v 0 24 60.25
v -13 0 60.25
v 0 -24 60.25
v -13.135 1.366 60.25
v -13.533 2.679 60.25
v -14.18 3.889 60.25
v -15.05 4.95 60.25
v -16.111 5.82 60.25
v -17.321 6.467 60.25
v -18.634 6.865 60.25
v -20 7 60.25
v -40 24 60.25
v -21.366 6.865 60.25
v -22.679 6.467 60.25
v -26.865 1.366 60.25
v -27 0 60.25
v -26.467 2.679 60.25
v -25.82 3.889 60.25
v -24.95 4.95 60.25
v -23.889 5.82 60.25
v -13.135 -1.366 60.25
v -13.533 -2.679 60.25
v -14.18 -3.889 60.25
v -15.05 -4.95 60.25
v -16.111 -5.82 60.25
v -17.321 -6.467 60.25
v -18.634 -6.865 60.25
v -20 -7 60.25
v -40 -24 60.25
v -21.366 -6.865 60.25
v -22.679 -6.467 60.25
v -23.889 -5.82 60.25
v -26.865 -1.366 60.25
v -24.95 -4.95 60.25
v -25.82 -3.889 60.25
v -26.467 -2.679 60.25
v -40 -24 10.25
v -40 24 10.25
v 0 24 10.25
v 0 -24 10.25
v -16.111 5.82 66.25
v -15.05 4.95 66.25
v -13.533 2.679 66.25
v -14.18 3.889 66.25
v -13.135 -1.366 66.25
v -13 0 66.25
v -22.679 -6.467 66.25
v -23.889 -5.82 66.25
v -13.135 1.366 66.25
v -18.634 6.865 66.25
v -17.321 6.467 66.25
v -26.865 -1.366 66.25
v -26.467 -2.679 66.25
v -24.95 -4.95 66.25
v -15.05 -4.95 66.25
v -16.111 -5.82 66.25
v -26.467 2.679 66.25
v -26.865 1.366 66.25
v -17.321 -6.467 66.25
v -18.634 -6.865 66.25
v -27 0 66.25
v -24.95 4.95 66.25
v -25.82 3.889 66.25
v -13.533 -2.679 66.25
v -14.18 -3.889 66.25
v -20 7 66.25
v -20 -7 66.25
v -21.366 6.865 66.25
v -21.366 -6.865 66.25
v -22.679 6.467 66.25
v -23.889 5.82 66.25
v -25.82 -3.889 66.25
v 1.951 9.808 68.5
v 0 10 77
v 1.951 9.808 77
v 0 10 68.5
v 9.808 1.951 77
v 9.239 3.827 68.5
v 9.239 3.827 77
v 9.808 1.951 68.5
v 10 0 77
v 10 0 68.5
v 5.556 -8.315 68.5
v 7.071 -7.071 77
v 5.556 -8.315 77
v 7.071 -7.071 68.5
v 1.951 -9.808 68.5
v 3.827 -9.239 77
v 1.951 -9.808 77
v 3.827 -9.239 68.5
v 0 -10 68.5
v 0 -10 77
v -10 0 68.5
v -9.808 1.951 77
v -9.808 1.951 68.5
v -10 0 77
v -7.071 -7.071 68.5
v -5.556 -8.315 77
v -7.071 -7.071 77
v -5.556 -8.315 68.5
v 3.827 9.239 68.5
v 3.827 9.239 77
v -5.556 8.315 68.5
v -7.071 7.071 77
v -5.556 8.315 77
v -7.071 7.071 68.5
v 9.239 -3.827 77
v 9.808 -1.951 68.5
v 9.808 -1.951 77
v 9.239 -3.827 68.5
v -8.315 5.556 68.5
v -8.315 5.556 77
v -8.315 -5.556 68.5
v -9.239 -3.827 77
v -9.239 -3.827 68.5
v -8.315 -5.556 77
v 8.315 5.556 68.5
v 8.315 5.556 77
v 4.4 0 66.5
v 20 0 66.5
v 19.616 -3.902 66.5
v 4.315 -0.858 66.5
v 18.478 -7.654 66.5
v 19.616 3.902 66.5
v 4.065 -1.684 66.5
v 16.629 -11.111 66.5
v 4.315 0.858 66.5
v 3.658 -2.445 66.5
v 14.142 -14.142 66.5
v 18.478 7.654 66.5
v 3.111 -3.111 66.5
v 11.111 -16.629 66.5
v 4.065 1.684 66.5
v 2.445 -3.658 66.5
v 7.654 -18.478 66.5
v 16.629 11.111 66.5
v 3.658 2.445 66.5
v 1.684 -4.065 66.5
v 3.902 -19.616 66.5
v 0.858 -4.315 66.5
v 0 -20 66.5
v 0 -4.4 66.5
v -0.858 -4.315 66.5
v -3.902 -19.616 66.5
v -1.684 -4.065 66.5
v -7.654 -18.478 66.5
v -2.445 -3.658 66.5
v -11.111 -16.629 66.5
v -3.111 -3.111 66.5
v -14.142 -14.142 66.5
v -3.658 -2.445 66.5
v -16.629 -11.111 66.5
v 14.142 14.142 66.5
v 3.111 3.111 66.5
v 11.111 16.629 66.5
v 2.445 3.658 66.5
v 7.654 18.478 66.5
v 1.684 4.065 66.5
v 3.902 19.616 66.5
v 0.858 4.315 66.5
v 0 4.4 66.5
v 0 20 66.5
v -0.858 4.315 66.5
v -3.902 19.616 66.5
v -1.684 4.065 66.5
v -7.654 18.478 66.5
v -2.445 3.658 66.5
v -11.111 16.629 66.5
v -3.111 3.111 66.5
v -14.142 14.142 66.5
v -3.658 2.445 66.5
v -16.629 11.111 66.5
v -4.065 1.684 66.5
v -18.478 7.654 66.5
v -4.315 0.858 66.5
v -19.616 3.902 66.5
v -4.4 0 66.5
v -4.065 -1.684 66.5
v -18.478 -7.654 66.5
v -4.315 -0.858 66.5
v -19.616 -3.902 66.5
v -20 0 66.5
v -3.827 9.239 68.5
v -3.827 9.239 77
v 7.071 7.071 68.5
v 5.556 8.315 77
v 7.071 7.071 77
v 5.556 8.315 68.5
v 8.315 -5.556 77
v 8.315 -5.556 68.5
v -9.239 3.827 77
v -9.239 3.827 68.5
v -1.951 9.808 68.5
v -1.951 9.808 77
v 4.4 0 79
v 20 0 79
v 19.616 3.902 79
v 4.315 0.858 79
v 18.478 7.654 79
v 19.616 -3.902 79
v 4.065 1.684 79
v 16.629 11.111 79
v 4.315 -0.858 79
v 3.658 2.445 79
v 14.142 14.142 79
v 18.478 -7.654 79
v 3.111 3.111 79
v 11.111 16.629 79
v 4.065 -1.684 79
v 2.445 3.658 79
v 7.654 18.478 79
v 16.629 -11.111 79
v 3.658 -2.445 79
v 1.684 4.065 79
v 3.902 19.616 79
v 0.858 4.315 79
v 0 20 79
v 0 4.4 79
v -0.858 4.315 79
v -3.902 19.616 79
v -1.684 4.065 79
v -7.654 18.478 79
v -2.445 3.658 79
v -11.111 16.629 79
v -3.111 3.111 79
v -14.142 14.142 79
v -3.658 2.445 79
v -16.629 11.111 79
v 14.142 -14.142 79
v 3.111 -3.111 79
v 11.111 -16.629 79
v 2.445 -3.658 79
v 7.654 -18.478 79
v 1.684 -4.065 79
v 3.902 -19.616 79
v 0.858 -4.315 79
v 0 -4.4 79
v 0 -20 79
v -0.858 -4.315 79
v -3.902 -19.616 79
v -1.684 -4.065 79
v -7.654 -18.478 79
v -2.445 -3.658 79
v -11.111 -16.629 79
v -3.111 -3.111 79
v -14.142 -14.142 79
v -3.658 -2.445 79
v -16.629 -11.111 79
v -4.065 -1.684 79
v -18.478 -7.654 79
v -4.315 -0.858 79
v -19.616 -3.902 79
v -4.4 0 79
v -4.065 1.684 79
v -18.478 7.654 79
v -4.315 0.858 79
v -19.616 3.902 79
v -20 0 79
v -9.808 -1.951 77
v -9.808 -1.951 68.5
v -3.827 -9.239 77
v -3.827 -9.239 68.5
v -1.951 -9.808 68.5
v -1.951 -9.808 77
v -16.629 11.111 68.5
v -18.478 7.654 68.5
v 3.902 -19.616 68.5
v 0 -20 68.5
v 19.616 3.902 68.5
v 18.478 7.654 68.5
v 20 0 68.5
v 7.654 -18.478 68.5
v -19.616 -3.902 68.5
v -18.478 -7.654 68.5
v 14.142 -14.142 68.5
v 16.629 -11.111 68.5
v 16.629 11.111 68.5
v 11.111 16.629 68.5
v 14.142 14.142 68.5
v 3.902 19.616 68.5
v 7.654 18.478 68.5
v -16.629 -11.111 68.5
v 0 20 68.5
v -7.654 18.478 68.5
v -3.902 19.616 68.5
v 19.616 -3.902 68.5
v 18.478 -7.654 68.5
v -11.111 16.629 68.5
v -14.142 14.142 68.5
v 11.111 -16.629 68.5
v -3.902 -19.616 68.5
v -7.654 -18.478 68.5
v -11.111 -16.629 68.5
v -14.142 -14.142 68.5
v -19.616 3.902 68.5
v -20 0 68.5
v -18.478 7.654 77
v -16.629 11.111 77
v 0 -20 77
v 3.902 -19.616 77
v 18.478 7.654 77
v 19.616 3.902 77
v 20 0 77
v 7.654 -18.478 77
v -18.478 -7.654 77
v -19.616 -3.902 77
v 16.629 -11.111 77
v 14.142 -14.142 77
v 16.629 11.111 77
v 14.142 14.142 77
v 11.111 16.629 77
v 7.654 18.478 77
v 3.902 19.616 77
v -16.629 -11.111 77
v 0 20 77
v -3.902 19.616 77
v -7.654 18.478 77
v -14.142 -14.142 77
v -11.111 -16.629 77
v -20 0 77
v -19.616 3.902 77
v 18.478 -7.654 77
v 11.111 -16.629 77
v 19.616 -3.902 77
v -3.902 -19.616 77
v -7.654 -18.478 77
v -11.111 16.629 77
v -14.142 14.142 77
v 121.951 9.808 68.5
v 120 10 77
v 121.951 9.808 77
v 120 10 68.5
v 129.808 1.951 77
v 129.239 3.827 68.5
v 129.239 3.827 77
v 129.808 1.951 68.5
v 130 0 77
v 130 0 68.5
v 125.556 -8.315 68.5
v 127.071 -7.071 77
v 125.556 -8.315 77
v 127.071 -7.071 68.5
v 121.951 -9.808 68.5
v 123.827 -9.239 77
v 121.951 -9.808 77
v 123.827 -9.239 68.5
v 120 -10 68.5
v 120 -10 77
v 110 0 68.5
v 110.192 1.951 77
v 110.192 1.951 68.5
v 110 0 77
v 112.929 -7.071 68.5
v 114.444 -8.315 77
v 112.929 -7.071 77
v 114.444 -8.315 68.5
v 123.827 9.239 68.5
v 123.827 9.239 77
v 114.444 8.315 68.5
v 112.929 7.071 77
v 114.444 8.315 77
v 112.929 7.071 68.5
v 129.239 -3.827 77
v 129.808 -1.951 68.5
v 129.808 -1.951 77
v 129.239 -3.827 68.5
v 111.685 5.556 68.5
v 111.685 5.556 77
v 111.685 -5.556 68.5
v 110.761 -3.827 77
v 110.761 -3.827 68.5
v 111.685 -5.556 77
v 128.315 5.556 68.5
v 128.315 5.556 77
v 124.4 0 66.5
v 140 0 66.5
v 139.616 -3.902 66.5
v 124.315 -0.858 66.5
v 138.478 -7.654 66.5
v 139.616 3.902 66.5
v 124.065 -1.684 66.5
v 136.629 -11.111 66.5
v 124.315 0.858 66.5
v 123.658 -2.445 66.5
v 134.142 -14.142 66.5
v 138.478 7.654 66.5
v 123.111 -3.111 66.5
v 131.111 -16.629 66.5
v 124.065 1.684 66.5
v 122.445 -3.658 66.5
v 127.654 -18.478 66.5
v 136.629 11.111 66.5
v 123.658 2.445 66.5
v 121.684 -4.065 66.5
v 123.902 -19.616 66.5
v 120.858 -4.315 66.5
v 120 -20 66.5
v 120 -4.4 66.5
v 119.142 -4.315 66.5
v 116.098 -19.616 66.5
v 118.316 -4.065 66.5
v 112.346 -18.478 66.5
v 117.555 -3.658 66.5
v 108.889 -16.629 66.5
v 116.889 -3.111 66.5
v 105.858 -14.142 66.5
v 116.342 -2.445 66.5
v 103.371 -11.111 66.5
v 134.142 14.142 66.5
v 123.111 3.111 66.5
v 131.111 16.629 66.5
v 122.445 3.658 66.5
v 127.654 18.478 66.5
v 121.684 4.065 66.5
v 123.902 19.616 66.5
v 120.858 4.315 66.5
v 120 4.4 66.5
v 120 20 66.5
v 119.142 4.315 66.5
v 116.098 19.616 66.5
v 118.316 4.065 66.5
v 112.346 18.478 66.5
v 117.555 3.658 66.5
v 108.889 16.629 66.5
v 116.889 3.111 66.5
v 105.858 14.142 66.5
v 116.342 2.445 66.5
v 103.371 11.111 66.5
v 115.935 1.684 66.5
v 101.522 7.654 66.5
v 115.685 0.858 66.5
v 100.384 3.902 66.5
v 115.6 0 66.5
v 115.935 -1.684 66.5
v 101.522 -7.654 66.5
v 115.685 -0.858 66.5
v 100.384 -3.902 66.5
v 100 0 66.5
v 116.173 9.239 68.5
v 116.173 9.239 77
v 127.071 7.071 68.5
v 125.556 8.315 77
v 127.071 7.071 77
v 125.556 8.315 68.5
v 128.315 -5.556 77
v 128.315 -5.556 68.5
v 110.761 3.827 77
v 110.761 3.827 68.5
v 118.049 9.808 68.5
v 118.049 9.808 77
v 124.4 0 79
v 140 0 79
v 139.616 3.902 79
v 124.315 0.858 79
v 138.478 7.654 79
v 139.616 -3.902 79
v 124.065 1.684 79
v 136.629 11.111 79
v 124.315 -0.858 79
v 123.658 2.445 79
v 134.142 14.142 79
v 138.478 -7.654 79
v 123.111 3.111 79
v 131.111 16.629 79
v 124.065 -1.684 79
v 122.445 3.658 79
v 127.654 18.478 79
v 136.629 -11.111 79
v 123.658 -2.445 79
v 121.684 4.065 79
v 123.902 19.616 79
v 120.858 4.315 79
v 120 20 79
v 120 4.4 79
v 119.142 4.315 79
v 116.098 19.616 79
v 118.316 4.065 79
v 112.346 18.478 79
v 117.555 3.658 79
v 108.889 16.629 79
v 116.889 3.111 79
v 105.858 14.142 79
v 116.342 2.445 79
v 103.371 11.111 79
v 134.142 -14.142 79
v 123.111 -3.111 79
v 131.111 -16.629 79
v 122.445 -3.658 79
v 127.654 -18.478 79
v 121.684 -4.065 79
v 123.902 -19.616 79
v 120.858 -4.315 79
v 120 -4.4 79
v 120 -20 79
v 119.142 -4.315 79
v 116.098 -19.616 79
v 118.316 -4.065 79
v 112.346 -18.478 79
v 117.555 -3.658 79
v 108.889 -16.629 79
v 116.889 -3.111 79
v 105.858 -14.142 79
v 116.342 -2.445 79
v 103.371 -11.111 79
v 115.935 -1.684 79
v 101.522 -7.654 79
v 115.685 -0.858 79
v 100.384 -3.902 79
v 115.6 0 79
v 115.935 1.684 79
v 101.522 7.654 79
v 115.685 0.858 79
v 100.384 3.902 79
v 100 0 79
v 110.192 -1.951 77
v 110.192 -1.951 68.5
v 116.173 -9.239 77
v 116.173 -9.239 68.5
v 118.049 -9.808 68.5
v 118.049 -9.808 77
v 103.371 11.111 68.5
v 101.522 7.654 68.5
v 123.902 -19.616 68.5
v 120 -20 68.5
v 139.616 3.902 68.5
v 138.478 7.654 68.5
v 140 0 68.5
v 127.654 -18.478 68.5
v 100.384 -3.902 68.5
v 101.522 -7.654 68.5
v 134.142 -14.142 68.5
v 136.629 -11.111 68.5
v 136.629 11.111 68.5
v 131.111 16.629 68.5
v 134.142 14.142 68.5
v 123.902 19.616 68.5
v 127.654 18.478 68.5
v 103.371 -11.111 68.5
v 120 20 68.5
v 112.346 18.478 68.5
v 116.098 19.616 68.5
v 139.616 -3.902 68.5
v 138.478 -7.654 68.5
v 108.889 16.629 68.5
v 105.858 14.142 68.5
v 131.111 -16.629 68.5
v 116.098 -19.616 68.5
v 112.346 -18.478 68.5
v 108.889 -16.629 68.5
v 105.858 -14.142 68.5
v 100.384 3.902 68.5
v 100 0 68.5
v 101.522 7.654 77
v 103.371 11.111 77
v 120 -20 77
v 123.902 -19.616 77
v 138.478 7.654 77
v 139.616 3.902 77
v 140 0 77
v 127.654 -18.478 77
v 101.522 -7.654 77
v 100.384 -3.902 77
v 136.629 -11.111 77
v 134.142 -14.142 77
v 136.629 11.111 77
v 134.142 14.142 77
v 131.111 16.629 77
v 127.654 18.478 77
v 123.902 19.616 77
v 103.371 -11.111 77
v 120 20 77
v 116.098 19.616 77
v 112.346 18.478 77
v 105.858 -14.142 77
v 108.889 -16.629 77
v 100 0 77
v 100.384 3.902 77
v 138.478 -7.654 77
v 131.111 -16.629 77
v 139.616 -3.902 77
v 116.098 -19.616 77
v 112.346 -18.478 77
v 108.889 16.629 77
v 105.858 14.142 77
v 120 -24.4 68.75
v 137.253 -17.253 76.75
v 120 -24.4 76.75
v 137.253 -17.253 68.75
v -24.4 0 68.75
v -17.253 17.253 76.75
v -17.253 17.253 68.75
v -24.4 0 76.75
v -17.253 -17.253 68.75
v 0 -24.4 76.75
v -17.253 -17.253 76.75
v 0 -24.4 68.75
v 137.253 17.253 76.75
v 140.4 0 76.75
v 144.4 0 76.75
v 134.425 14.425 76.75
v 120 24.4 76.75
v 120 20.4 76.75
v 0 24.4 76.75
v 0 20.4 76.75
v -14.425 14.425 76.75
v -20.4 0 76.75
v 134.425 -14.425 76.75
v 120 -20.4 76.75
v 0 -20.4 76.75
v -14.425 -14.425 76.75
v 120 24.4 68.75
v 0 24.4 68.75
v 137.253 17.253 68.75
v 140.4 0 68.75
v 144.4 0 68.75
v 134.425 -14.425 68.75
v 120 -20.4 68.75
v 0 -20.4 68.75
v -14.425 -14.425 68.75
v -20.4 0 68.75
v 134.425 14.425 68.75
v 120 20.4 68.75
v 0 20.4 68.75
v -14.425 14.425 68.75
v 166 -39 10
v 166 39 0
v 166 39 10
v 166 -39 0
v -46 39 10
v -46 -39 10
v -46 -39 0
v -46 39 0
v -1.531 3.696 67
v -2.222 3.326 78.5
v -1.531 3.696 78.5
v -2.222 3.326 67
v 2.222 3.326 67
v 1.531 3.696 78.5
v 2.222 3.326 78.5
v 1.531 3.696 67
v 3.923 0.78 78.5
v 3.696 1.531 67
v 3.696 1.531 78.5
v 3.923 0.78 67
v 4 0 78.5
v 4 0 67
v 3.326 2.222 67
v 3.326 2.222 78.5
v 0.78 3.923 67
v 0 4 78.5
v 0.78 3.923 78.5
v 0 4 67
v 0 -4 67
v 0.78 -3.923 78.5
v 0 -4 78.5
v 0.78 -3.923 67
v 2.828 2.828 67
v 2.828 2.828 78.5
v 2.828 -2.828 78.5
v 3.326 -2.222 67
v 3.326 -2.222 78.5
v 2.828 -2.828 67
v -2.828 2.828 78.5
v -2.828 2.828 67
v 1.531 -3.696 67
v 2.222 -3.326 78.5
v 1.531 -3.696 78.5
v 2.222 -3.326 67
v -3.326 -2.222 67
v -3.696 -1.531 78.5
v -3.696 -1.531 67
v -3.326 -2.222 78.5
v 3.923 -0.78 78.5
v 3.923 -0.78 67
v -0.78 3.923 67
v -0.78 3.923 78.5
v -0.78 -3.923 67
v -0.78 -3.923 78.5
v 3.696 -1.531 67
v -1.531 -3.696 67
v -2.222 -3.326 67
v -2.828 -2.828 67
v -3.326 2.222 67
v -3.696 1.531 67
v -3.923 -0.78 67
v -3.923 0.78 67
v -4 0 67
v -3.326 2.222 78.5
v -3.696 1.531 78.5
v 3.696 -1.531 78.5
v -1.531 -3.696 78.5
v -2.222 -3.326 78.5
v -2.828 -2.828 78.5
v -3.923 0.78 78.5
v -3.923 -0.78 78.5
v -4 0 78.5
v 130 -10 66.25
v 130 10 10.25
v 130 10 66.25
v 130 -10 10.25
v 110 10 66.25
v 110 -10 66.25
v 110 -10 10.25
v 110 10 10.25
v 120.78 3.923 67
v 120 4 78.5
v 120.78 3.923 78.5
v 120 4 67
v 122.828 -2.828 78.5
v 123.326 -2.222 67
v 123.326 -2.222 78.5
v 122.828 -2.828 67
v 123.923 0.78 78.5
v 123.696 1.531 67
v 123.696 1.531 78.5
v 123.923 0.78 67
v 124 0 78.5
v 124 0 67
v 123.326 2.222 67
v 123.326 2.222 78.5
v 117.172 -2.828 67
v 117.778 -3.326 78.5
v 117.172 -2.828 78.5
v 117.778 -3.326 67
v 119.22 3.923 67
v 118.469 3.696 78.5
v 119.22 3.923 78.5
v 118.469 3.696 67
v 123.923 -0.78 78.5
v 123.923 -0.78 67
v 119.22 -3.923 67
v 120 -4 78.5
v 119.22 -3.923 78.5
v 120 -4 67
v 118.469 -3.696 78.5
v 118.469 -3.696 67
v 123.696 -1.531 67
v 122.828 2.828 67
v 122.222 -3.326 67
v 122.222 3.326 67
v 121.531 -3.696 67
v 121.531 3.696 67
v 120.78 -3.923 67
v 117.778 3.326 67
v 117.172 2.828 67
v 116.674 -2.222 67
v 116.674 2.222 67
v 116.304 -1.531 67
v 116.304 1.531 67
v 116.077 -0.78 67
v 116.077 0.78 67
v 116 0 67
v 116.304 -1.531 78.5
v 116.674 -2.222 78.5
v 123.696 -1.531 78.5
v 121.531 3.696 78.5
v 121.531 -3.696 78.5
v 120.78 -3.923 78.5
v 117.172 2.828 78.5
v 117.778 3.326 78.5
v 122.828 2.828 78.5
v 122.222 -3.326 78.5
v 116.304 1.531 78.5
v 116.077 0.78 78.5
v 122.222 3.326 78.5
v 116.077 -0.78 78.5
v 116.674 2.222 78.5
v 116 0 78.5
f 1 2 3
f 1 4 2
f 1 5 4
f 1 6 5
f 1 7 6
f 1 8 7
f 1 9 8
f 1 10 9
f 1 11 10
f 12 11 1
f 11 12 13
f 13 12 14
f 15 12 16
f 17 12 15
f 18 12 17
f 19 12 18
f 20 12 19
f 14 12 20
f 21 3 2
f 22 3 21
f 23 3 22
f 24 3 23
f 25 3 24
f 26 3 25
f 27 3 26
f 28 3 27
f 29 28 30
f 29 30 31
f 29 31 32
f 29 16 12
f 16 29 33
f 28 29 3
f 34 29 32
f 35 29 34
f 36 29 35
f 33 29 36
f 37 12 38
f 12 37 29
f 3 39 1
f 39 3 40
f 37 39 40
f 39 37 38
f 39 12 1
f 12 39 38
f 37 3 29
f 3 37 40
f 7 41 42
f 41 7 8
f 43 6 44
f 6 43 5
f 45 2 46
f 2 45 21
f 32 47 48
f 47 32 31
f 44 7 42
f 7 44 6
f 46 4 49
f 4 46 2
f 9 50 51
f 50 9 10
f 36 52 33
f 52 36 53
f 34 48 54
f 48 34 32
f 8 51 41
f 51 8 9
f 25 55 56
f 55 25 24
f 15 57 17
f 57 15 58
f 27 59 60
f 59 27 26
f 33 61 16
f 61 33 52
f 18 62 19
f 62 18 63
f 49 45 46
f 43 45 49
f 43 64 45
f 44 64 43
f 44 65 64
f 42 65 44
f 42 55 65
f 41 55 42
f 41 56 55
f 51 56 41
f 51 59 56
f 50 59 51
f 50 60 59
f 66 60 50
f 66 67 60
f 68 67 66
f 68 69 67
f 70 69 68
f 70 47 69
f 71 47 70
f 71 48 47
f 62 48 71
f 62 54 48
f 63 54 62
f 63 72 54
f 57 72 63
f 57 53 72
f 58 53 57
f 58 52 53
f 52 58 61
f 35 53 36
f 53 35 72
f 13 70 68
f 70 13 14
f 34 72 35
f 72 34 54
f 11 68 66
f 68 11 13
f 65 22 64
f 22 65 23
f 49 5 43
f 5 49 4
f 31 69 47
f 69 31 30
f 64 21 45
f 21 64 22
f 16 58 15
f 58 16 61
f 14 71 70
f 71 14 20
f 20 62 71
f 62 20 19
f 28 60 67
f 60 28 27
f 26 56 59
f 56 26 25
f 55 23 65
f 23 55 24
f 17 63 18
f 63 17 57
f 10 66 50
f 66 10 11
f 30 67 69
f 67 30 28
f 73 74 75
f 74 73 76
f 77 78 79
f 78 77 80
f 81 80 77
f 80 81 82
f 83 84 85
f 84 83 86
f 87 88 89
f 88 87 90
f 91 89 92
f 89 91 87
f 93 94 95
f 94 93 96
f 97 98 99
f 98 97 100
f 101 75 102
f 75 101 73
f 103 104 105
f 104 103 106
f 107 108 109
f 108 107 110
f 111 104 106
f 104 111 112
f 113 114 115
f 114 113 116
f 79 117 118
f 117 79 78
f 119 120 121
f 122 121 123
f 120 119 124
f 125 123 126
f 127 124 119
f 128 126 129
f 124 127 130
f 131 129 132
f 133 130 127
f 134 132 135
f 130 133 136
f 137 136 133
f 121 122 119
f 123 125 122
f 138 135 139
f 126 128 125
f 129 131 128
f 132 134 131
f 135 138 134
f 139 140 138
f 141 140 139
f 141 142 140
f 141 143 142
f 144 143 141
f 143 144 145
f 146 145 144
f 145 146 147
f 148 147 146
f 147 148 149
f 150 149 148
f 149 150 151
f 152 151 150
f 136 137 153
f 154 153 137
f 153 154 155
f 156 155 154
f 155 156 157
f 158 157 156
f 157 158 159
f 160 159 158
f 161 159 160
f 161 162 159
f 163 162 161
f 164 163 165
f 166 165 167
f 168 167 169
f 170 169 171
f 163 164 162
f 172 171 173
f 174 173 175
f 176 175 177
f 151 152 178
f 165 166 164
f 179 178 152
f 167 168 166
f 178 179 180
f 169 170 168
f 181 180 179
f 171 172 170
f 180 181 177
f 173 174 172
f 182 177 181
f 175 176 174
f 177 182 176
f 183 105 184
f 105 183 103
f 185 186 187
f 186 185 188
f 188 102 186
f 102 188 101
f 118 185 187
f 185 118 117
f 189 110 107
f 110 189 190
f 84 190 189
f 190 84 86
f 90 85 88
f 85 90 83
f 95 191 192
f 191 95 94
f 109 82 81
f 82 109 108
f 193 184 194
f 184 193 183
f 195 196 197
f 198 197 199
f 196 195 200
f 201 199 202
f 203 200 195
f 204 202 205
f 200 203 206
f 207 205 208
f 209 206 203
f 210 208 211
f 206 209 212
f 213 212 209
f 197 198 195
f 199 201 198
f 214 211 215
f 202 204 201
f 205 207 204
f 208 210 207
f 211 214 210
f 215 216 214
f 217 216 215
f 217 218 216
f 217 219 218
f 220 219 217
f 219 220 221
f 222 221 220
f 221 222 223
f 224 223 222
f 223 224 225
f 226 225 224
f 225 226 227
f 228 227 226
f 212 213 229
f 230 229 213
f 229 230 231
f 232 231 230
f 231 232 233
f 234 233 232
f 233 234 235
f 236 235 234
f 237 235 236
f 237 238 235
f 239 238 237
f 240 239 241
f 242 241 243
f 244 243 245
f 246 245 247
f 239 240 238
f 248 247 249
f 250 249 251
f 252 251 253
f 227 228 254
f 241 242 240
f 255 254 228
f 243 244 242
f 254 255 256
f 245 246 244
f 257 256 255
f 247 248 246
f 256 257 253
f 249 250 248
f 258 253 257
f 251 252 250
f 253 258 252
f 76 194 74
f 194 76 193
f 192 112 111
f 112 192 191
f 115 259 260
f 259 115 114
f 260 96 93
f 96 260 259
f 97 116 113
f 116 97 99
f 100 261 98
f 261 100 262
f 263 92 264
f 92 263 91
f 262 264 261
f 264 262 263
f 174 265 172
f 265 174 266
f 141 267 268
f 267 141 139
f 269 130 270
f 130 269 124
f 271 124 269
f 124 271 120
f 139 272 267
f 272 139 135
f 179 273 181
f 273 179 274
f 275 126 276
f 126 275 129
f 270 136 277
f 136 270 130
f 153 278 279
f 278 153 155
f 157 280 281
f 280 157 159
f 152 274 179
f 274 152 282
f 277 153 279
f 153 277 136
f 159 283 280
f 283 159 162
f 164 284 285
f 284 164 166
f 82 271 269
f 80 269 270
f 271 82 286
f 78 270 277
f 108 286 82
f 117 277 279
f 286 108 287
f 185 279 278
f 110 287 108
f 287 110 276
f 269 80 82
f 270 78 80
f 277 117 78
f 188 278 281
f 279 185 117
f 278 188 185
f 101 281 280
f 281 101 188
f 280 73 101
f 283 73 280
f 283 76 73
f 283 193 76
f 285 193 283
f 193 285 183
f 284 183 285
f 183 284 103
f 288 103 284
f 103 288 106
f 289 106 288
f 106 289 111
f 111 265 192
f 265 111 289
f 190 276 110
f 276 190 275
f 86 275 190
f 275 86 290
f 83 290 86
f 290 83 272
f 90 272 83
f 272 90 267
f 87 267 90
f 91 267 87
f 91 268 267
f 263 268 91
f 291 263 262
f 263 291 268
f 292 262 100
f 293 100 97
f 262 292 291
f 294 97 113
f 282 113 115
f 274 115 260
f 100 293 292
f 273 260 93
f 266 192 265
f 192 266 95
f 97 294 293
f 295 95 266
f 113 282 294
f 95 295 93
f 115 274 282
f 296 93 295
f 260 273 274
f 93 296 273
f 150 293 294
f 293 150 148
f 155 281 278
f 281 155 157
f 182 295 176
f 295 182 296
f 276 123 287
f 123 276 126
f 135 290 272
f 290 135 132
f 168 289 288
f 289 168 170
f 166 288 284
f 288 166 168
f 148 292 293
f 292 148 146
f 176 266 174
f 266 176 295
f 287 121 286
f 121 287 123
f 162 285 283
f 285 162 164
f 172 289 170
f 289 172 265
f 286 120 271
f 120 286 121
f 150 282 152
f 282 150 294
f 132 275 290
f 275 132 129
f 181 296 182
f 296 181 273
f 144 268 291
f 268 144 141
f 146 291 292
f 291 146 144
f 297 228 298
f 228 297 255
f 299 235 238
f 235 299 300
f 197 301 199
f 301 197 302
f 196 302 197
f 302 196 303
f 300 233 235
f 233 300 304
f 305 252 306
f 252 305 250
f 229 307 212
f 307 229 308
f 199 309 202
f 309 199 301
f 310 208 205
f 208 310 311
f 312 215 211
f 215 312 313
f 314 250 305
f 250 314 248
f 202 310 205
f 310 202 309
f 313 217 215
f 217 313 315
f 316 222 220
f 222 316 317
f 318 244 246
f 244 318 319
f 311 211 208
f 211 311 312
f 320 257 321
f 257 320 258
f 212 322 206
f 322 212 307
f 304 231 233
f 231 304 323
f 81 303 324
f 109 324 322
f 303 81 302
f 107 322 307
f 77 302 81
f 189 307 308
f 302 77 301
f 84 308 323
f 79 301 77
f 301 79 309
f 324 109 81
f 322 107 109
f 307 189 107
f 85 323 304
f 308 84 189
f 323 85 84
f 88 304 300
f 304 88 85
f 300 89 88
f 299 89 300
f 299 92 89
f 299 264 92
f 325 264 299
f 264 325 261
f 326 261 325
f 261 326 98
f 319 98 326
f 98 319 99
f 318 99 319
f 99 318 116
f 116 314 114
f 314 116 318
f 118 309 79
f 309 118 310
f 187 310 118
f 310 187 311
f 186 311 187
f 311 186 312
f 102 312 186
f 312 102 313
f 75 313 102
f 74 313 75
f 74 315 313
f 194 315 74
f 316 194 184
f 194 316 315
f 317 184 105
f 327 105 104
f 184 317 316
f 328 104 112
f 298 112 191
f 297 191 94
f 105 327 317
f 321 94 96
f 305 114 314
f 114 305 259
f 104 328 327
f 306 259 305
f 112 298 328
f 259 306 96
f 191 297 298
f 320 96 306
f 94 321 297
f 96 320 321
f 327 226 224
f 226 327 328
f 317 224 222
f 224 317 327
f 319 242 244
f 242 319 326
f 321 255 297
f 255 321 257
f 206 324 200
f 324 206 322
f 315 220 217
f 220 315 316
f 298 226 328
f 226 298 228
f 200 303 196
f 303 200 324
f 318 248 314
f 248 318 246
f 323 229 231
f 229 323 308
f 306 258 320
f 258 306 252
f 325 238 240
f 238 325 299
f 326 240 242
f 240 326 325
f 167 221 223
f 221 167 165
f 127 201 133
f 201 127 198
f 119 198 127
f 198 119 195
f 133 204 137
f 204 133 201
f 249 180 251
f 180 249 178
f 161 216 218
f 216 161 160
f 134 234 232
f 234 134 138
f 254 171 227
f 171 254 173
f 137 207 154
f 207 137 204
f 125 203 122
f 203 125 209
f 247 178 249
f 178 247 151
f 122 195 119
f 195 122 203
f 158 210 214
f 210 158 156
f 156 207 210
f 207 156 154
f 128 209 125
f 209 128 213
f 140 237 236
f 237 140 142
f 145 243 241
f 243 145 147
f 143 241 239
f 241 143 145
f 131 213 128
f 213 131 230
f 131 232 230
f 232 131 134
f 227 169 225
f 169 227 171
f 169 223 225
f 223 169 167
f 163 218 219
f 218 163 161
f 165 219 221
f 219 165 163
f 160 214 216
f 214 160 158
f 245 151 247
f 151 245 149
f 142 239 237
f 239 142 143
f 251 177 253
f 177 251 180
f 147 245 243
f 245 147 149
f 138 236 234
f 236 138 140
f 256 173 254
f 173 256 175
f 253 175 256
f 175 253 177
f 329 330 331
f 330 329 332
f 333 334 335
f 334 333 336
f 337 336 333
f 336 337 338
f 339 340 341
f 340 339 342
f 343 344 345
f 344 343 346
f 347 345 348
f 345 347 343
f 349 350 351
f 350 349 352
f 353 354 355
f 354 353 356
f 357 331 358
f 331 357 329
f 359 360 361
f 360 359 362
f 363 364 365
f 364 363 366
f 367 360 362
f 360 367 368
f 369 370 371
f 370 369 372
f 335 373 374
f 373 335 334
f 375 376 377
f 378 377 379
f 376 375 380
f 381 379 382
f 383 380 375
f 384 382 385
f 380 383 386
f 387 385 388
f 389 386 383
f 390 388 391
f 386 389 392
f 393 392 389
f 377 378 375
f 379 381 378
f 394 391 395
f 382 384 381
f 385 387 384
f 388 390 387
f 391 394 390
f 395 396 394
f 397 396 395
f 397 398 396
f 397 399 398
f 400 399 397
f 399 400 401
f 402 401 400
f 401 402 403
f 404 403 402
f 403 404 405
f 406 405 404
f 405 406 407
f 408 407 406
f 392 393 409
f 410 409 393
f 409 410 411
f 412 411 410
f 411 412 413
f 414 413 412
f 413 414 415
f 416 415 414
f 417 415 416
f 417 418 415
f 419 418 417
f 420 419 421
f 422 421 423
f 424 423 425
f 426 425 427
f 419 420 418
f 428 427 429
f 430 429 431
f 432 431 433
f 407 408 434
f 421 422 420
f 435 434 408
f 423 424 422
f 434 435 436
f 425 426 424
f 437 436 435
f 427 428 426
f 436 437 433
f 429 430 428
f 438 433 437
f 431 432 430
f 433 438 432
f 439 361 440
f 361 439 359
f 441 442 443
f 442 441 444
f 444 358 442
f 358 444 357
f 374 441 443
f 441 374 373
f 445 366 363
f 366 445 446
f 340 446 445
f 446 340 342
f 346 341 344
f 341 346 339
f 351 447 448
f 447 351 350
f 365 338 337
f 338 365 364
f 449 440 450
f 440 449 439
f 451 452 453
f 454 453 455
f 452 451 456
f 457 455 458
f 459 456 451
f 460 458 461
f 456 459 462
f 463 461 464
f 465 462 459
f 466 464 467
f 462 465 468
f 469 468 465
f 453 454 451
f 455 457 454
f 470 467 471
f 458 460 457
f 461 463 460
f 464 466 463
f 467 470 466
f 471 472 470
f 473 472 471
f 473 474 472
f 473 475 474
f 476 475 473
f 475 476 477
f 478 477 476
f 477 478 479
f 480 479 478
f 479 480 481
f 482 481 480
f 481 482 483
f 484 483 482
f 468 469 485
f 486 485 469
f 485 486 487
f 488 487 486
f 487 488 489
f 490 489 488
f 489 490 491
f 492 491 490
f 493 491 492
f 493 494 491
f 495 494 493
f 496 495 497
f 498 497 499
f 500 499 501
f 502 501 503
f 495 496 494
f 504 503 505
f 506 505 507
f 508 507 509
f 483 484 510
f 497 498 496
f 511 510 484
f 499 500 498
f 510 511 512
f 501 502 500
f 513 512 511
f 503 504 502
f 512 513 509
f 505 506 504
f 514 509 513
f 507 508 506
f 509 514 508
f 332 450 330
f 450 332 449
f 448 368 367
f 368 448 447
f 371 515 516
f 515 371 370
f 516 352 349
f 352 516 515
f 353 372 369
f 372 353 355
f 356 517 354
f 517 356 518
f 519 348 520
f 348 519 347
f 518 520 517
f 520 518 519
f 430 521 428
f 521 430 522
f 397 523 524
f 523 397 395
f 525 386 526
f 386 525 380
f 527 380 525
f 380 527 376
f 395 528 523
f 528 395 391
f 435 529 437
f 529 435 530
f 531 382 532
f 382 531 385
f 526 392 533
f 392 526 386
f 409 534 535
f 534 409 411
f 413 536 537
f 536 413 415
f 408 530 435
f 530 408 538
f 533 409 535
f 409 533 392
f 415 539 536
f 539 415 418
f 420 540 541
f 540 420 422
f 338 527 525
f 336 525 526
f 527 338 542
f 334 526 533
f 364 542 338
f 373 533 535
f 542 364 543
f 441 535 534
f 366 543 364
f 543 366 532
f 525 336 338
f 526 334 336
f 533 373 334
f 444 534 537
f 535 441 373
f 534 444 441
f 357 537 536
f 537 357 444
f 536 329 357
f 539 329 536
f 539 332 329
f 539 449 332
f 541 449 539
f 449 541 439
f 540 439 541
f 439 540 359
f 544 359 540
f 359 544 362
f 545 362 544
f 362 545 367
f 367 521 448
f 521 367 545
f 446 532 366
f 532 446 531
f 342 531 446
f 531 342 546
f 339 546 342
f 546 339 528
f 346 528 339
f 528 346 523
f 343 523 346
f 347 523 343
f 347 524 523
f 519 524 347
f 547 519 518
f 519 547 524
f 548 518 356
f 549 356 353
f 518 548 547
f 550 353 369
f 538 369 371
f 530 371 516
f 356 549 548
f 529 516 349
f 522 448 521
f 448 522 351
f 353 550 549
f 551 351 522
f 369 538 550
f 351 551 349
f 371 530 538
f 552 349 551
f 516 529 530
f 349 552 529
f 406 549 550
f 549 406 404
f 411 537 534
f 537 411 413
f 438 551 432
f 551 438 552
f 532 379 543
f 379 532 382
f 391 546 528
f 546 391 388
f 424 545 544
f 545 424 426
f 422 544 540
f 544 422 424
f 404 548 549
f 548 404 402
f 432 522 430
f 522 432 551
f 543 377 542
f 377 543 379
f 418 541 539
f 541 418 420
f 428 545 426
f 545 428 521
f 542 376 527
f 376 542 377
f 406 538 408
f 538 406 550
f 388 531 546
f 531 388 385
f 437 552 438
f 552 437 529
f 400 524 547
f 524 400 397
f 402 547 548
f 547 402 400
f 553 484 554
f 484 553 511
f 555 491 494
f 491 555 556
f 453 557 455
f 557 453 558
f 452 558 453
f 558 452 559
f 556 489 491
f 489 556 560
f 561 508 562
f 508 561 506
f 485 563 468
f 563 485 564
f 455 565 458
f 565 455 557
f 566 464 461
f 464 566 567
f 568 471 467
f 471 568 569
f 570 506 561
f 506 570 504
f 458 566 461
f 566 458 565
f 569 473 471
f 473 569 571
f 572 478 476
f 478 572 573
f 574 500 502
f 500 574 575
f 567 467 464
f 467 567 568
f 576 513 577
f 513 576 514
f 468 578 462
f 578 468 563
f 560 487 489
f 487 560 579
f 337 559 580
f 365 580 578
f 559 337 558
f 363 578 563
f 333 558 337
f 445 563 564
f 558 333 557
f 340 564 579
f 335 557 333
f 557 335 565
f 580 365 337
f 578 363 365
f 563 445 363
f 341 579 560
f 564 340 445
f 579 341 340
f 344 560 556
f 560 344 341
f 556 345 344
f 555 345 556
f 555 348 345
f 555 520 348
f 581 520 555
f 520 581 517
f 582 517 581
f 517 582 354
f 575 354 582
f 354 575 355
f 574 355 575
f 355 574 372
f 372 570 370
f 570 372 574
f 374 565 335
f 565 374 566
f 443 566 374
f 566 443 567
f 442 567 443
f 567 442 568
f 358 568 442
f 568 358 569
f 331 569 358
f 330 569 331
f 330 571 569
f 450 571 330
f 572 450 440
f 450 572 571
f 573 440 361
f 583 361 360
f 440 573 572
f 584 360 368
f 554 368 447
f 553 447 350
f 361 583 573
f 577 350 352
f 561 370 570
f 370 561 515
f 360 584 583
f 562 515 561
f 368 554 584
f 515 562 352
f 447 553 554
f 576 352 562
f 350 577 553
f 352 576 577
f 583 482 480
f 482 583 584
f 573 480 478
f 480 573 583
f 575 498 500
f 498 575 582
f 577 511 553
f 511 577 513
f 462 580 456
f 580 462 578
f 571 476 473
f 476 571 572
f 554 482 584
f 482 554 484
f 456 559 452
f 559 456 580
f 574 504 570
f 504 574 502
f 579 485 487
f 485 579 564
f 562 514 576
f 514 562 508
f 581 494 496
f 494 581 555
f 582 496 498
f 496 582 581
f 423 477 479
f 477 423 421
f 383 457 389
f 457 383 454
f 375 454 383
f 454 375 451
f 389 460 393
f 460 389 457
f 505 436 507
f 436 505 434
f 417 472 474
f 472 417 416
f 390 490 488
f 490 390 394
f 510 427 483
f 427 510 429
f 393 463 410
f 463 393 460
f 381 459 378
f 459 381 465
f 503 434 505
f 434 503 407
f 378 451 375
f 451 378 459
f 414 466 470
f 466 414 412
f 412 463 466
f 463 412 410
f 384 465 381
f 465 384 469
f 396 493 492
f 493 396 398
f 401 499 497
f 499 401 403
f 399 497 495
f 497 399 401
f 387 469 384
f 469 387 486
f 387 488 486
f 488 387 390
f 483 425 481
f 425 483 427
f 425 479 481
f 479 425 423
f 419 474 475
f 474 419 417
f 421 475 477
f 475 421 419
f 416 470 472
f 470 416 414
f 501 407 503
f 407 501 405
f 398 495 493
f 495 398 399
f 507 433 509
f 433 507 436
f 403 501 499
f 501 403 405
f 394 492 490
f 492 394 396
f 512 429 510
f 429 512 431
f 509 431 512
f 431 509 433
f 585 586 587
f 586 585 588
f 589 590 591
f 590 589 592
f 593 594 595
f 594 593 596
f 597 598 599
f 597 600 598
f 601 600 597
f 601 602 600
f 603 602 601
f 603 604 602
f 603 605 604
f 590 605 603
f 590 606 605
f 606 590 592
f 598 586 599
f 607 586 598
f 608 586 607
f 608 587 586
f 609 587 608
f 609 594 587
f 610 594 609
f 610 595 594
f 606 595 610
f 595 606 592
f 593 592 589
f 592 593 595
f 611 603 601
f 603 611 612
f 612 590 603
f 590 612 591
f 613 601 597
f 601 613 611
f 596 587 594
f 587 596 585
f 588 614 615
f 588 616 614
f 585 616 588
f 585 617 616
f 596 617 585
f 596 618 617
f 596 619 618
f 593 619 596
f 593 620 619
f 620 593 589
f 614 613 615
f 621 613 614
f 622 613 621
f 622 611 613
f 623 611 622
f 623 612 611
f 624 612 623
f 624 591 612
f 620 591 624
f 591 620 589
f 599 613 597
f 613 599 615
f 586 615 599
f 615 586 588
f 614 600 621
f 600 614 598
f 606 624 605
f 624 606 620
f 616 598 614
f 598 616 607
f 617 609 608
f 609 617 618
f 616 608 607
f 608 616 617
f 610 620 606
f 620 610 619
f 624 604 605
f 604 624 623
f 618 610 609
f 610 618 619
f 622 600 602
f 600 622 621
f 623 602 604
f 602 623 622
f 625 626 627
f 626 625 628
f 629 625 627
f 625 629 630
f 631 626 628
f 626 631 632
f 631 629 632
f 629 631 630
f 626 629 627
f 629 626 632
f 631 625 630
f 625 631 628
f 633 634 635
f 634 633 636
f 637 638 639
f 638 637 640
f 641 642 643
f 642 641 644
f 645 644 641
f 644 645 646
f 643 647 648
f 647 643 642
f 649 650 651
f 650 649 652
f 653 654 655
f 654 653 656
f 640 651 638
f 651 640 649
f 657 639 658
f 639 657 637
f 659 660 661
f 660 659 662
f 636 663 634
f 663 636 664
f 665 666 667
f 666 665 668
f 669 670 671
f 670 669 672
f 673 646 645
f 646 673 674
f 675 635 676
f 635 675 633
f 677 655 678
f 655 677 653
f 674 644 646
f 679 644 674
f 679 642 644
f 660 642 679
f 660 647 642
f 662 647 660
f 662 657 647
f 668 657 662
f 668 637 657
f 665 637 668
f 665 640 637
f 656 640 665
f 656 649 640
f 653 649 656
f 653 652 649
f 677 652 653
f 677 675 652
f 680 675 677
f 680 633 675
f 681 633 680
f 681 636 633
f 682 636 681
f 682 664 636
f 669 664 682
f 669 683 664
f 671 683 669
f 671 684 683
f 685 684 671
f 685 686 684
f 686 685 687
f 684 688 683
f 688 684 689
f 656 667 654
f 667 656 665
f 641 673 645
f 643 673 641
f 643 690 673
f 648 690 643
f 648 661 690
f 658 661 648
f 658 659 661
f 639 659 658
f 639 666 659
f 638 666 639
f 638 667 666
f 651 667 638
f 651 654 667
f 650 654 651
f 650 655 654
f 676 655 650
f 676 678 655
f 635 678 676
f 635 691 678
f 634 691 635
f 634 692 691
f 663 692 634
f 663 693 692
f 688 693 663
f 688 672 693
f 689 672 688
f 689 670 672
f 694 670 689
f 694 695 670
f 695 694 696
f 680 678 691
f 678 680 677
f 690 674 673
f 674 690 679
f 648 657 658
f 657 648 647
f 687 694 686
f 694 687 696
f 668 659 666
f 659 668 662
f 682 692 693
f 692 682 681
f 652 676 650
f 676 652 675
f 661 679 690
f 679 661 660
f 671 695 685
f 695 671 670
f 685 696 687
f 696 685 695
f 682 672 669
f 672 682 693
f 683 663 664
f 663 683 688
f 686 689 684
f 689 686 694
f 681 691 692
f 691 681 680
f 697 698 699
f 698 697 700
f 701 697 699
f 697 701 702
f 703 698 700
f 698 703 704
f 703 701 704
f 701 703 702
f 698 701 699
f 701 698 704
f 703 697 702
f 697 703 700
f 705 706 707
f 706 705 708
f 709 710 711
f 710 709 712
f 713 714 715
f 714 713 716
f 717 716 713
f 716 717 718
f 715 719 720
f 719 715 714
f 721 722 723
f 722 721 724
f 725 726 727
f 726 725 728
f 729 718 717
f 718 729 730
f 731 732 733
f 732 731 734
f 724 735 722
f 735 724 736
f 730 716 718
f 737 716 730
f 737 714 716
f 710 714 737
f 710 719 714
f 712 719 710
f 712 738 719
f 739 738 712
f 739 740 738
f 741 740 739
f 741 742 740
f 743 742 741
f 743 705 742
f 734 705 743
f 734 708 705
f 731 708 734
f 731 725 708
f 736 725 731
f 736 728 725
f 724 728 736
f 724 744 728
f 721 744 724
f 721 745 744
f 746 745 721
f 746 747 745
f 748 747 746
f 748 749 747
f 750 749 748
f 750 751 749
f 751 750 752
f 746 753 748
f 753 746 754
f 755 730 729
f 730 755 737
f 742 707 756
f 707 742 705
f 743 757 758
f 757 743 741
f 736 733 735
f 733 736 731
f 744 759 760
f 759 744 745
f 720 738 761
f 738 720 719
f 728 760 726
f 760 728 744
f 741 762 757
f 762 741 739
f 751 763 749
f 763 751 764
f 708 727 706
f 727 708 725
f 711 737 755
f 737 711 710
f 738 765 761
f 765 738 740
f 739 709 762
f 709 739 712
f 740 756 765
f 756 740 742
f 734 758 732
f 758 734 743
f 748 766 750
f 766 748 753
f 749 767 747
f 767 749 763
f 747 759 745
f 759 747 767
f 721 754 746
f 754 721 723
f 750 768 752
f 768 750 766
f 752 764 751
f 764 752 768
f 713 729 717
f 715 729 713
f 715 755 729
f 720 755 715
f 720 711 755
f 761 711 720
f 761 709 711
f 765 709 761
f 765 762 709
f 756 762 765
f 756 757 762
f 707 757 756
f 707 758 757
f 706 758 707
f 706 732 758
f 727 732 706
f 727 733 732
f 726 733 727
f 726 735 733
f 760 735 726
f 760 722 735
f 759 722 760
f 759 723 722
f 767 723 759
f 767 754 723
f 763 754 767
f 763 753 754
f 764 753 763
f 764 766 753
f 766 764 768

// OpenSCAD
$fn = 32;

// ------------------------------------------------------------------------
// Motor belt drive: span 120 mm, pulleys d40, belt 8 mm wide
// Every part is its own module, assembly() places every instance.
// ------------------------------------------------------------------------

// --- part 1 ---
module base_plate() {
  difference() {
    translate([-106, -39, 0]) cube([212, 78, 10]);
  }
}

// --- part 2 ---
module motor() {
  union() {
    translate([-25, -24, 0]) cube([50, 48, 40]);
    translate([28, 0, 20]) rotate([0, 90, 0]) cylinder(h = 6, d = 14, center = true);
  }
}

// --- part 3 ---
module drive_shaft() {
  translate([0, 0, -5.75]) cylinder(h = 11.5, d = 8);
}

// --- part 4 ---
module pulley_drive() {
  difference() {
    union() {
      cylinder(h = 12.5, d = 20);
      cylinder(h = 2, d = 40);
      translate([0, 0, 10.5]) cylinder(h = 2, d = 40);
    }
    translate([0, 0, -1]) cylinder(h = 14.5, d = 8.8);
  }
}

// --- part 5 ---
module idler_post() {
  translate([-10, -10, 0]) cube([20, 20, 56]);
}

// --- part 6 ---
module driven_shaft() {
  translate([0, 0, -5.75]) cylinder(h = 11.5, d = 8);
}

// --- part 7 ---
module pulley_driven() {
  difference() {
    union() {
      cylinder(h = 12.5, d = 20);
      cylinder(h = 2, d = 40);
      translate([0, 0, 10.5]) cylinder(h = 2, d = 40);
    }
    translate([0, 0, -1]) cylinder(h = 14.5, d = 8.8);
  }
}

// --- part 8 ---
module drive_belt() {
  difference() {
    linear_extrude(height = 8) polygon(points = concat([for (a = [90 : 45 : 270]) [24.4 * cos(a), 24.4 * sin(a)]], [for (a = [270 : 45 : 450]) [120 + 24.4 * cos(a), 24.4 * sin(a)]]));
    translate([0, 0, -1]) linear_extrude(height = 10) polygon(points = concat([for (a = [90 : 45 : 270]) [20.4 * cos(a), 20.4 * sin(a)]], [for (a = [270 : 45 : 450]) [120 + 20.4 * cos(a), 20.4 * sin(a)]]));
  }
}

// --- assembly ---
module assembly() {
  color([0.80, 0.24, 0.20]) translate([60, 0, 0]) rotate([0, 0, 0]) base_plate();
  color([0.20, 0.45, 0.75]) translate([0, 0, 35.25]) rotate([0, 270, 0]) motor();
  color([0.25, 0.62, 0.32]) translate([0, 0, 72.75]) rotate([0, 0, 0]) drive_shaft();
  color([0.92, 0.70, 0.18]) translate([0, 0, 66.5]) rotate([0, 0, 0]) pulley_drive();
  color([0.58, 0.35, 0.70]) translate([120, 0, 10.25]) rotate([0, 0, 0]) idler_post();
  color([0.16, 0.66, 0.66]) translate([120, 0, 72.75]) rotate([0, 0, 0]) driven_shaft();
  color([0.85, 0.48, 0.18]) translate([120, 0, 66.5]) rotate([0, 0, 0]) pulley_driven();
  color([0.55, 0.60, 0.65]) translate([0, 0, 68.75]) rotate([0, 0, 0]) drive_belt();
}

assembly();
